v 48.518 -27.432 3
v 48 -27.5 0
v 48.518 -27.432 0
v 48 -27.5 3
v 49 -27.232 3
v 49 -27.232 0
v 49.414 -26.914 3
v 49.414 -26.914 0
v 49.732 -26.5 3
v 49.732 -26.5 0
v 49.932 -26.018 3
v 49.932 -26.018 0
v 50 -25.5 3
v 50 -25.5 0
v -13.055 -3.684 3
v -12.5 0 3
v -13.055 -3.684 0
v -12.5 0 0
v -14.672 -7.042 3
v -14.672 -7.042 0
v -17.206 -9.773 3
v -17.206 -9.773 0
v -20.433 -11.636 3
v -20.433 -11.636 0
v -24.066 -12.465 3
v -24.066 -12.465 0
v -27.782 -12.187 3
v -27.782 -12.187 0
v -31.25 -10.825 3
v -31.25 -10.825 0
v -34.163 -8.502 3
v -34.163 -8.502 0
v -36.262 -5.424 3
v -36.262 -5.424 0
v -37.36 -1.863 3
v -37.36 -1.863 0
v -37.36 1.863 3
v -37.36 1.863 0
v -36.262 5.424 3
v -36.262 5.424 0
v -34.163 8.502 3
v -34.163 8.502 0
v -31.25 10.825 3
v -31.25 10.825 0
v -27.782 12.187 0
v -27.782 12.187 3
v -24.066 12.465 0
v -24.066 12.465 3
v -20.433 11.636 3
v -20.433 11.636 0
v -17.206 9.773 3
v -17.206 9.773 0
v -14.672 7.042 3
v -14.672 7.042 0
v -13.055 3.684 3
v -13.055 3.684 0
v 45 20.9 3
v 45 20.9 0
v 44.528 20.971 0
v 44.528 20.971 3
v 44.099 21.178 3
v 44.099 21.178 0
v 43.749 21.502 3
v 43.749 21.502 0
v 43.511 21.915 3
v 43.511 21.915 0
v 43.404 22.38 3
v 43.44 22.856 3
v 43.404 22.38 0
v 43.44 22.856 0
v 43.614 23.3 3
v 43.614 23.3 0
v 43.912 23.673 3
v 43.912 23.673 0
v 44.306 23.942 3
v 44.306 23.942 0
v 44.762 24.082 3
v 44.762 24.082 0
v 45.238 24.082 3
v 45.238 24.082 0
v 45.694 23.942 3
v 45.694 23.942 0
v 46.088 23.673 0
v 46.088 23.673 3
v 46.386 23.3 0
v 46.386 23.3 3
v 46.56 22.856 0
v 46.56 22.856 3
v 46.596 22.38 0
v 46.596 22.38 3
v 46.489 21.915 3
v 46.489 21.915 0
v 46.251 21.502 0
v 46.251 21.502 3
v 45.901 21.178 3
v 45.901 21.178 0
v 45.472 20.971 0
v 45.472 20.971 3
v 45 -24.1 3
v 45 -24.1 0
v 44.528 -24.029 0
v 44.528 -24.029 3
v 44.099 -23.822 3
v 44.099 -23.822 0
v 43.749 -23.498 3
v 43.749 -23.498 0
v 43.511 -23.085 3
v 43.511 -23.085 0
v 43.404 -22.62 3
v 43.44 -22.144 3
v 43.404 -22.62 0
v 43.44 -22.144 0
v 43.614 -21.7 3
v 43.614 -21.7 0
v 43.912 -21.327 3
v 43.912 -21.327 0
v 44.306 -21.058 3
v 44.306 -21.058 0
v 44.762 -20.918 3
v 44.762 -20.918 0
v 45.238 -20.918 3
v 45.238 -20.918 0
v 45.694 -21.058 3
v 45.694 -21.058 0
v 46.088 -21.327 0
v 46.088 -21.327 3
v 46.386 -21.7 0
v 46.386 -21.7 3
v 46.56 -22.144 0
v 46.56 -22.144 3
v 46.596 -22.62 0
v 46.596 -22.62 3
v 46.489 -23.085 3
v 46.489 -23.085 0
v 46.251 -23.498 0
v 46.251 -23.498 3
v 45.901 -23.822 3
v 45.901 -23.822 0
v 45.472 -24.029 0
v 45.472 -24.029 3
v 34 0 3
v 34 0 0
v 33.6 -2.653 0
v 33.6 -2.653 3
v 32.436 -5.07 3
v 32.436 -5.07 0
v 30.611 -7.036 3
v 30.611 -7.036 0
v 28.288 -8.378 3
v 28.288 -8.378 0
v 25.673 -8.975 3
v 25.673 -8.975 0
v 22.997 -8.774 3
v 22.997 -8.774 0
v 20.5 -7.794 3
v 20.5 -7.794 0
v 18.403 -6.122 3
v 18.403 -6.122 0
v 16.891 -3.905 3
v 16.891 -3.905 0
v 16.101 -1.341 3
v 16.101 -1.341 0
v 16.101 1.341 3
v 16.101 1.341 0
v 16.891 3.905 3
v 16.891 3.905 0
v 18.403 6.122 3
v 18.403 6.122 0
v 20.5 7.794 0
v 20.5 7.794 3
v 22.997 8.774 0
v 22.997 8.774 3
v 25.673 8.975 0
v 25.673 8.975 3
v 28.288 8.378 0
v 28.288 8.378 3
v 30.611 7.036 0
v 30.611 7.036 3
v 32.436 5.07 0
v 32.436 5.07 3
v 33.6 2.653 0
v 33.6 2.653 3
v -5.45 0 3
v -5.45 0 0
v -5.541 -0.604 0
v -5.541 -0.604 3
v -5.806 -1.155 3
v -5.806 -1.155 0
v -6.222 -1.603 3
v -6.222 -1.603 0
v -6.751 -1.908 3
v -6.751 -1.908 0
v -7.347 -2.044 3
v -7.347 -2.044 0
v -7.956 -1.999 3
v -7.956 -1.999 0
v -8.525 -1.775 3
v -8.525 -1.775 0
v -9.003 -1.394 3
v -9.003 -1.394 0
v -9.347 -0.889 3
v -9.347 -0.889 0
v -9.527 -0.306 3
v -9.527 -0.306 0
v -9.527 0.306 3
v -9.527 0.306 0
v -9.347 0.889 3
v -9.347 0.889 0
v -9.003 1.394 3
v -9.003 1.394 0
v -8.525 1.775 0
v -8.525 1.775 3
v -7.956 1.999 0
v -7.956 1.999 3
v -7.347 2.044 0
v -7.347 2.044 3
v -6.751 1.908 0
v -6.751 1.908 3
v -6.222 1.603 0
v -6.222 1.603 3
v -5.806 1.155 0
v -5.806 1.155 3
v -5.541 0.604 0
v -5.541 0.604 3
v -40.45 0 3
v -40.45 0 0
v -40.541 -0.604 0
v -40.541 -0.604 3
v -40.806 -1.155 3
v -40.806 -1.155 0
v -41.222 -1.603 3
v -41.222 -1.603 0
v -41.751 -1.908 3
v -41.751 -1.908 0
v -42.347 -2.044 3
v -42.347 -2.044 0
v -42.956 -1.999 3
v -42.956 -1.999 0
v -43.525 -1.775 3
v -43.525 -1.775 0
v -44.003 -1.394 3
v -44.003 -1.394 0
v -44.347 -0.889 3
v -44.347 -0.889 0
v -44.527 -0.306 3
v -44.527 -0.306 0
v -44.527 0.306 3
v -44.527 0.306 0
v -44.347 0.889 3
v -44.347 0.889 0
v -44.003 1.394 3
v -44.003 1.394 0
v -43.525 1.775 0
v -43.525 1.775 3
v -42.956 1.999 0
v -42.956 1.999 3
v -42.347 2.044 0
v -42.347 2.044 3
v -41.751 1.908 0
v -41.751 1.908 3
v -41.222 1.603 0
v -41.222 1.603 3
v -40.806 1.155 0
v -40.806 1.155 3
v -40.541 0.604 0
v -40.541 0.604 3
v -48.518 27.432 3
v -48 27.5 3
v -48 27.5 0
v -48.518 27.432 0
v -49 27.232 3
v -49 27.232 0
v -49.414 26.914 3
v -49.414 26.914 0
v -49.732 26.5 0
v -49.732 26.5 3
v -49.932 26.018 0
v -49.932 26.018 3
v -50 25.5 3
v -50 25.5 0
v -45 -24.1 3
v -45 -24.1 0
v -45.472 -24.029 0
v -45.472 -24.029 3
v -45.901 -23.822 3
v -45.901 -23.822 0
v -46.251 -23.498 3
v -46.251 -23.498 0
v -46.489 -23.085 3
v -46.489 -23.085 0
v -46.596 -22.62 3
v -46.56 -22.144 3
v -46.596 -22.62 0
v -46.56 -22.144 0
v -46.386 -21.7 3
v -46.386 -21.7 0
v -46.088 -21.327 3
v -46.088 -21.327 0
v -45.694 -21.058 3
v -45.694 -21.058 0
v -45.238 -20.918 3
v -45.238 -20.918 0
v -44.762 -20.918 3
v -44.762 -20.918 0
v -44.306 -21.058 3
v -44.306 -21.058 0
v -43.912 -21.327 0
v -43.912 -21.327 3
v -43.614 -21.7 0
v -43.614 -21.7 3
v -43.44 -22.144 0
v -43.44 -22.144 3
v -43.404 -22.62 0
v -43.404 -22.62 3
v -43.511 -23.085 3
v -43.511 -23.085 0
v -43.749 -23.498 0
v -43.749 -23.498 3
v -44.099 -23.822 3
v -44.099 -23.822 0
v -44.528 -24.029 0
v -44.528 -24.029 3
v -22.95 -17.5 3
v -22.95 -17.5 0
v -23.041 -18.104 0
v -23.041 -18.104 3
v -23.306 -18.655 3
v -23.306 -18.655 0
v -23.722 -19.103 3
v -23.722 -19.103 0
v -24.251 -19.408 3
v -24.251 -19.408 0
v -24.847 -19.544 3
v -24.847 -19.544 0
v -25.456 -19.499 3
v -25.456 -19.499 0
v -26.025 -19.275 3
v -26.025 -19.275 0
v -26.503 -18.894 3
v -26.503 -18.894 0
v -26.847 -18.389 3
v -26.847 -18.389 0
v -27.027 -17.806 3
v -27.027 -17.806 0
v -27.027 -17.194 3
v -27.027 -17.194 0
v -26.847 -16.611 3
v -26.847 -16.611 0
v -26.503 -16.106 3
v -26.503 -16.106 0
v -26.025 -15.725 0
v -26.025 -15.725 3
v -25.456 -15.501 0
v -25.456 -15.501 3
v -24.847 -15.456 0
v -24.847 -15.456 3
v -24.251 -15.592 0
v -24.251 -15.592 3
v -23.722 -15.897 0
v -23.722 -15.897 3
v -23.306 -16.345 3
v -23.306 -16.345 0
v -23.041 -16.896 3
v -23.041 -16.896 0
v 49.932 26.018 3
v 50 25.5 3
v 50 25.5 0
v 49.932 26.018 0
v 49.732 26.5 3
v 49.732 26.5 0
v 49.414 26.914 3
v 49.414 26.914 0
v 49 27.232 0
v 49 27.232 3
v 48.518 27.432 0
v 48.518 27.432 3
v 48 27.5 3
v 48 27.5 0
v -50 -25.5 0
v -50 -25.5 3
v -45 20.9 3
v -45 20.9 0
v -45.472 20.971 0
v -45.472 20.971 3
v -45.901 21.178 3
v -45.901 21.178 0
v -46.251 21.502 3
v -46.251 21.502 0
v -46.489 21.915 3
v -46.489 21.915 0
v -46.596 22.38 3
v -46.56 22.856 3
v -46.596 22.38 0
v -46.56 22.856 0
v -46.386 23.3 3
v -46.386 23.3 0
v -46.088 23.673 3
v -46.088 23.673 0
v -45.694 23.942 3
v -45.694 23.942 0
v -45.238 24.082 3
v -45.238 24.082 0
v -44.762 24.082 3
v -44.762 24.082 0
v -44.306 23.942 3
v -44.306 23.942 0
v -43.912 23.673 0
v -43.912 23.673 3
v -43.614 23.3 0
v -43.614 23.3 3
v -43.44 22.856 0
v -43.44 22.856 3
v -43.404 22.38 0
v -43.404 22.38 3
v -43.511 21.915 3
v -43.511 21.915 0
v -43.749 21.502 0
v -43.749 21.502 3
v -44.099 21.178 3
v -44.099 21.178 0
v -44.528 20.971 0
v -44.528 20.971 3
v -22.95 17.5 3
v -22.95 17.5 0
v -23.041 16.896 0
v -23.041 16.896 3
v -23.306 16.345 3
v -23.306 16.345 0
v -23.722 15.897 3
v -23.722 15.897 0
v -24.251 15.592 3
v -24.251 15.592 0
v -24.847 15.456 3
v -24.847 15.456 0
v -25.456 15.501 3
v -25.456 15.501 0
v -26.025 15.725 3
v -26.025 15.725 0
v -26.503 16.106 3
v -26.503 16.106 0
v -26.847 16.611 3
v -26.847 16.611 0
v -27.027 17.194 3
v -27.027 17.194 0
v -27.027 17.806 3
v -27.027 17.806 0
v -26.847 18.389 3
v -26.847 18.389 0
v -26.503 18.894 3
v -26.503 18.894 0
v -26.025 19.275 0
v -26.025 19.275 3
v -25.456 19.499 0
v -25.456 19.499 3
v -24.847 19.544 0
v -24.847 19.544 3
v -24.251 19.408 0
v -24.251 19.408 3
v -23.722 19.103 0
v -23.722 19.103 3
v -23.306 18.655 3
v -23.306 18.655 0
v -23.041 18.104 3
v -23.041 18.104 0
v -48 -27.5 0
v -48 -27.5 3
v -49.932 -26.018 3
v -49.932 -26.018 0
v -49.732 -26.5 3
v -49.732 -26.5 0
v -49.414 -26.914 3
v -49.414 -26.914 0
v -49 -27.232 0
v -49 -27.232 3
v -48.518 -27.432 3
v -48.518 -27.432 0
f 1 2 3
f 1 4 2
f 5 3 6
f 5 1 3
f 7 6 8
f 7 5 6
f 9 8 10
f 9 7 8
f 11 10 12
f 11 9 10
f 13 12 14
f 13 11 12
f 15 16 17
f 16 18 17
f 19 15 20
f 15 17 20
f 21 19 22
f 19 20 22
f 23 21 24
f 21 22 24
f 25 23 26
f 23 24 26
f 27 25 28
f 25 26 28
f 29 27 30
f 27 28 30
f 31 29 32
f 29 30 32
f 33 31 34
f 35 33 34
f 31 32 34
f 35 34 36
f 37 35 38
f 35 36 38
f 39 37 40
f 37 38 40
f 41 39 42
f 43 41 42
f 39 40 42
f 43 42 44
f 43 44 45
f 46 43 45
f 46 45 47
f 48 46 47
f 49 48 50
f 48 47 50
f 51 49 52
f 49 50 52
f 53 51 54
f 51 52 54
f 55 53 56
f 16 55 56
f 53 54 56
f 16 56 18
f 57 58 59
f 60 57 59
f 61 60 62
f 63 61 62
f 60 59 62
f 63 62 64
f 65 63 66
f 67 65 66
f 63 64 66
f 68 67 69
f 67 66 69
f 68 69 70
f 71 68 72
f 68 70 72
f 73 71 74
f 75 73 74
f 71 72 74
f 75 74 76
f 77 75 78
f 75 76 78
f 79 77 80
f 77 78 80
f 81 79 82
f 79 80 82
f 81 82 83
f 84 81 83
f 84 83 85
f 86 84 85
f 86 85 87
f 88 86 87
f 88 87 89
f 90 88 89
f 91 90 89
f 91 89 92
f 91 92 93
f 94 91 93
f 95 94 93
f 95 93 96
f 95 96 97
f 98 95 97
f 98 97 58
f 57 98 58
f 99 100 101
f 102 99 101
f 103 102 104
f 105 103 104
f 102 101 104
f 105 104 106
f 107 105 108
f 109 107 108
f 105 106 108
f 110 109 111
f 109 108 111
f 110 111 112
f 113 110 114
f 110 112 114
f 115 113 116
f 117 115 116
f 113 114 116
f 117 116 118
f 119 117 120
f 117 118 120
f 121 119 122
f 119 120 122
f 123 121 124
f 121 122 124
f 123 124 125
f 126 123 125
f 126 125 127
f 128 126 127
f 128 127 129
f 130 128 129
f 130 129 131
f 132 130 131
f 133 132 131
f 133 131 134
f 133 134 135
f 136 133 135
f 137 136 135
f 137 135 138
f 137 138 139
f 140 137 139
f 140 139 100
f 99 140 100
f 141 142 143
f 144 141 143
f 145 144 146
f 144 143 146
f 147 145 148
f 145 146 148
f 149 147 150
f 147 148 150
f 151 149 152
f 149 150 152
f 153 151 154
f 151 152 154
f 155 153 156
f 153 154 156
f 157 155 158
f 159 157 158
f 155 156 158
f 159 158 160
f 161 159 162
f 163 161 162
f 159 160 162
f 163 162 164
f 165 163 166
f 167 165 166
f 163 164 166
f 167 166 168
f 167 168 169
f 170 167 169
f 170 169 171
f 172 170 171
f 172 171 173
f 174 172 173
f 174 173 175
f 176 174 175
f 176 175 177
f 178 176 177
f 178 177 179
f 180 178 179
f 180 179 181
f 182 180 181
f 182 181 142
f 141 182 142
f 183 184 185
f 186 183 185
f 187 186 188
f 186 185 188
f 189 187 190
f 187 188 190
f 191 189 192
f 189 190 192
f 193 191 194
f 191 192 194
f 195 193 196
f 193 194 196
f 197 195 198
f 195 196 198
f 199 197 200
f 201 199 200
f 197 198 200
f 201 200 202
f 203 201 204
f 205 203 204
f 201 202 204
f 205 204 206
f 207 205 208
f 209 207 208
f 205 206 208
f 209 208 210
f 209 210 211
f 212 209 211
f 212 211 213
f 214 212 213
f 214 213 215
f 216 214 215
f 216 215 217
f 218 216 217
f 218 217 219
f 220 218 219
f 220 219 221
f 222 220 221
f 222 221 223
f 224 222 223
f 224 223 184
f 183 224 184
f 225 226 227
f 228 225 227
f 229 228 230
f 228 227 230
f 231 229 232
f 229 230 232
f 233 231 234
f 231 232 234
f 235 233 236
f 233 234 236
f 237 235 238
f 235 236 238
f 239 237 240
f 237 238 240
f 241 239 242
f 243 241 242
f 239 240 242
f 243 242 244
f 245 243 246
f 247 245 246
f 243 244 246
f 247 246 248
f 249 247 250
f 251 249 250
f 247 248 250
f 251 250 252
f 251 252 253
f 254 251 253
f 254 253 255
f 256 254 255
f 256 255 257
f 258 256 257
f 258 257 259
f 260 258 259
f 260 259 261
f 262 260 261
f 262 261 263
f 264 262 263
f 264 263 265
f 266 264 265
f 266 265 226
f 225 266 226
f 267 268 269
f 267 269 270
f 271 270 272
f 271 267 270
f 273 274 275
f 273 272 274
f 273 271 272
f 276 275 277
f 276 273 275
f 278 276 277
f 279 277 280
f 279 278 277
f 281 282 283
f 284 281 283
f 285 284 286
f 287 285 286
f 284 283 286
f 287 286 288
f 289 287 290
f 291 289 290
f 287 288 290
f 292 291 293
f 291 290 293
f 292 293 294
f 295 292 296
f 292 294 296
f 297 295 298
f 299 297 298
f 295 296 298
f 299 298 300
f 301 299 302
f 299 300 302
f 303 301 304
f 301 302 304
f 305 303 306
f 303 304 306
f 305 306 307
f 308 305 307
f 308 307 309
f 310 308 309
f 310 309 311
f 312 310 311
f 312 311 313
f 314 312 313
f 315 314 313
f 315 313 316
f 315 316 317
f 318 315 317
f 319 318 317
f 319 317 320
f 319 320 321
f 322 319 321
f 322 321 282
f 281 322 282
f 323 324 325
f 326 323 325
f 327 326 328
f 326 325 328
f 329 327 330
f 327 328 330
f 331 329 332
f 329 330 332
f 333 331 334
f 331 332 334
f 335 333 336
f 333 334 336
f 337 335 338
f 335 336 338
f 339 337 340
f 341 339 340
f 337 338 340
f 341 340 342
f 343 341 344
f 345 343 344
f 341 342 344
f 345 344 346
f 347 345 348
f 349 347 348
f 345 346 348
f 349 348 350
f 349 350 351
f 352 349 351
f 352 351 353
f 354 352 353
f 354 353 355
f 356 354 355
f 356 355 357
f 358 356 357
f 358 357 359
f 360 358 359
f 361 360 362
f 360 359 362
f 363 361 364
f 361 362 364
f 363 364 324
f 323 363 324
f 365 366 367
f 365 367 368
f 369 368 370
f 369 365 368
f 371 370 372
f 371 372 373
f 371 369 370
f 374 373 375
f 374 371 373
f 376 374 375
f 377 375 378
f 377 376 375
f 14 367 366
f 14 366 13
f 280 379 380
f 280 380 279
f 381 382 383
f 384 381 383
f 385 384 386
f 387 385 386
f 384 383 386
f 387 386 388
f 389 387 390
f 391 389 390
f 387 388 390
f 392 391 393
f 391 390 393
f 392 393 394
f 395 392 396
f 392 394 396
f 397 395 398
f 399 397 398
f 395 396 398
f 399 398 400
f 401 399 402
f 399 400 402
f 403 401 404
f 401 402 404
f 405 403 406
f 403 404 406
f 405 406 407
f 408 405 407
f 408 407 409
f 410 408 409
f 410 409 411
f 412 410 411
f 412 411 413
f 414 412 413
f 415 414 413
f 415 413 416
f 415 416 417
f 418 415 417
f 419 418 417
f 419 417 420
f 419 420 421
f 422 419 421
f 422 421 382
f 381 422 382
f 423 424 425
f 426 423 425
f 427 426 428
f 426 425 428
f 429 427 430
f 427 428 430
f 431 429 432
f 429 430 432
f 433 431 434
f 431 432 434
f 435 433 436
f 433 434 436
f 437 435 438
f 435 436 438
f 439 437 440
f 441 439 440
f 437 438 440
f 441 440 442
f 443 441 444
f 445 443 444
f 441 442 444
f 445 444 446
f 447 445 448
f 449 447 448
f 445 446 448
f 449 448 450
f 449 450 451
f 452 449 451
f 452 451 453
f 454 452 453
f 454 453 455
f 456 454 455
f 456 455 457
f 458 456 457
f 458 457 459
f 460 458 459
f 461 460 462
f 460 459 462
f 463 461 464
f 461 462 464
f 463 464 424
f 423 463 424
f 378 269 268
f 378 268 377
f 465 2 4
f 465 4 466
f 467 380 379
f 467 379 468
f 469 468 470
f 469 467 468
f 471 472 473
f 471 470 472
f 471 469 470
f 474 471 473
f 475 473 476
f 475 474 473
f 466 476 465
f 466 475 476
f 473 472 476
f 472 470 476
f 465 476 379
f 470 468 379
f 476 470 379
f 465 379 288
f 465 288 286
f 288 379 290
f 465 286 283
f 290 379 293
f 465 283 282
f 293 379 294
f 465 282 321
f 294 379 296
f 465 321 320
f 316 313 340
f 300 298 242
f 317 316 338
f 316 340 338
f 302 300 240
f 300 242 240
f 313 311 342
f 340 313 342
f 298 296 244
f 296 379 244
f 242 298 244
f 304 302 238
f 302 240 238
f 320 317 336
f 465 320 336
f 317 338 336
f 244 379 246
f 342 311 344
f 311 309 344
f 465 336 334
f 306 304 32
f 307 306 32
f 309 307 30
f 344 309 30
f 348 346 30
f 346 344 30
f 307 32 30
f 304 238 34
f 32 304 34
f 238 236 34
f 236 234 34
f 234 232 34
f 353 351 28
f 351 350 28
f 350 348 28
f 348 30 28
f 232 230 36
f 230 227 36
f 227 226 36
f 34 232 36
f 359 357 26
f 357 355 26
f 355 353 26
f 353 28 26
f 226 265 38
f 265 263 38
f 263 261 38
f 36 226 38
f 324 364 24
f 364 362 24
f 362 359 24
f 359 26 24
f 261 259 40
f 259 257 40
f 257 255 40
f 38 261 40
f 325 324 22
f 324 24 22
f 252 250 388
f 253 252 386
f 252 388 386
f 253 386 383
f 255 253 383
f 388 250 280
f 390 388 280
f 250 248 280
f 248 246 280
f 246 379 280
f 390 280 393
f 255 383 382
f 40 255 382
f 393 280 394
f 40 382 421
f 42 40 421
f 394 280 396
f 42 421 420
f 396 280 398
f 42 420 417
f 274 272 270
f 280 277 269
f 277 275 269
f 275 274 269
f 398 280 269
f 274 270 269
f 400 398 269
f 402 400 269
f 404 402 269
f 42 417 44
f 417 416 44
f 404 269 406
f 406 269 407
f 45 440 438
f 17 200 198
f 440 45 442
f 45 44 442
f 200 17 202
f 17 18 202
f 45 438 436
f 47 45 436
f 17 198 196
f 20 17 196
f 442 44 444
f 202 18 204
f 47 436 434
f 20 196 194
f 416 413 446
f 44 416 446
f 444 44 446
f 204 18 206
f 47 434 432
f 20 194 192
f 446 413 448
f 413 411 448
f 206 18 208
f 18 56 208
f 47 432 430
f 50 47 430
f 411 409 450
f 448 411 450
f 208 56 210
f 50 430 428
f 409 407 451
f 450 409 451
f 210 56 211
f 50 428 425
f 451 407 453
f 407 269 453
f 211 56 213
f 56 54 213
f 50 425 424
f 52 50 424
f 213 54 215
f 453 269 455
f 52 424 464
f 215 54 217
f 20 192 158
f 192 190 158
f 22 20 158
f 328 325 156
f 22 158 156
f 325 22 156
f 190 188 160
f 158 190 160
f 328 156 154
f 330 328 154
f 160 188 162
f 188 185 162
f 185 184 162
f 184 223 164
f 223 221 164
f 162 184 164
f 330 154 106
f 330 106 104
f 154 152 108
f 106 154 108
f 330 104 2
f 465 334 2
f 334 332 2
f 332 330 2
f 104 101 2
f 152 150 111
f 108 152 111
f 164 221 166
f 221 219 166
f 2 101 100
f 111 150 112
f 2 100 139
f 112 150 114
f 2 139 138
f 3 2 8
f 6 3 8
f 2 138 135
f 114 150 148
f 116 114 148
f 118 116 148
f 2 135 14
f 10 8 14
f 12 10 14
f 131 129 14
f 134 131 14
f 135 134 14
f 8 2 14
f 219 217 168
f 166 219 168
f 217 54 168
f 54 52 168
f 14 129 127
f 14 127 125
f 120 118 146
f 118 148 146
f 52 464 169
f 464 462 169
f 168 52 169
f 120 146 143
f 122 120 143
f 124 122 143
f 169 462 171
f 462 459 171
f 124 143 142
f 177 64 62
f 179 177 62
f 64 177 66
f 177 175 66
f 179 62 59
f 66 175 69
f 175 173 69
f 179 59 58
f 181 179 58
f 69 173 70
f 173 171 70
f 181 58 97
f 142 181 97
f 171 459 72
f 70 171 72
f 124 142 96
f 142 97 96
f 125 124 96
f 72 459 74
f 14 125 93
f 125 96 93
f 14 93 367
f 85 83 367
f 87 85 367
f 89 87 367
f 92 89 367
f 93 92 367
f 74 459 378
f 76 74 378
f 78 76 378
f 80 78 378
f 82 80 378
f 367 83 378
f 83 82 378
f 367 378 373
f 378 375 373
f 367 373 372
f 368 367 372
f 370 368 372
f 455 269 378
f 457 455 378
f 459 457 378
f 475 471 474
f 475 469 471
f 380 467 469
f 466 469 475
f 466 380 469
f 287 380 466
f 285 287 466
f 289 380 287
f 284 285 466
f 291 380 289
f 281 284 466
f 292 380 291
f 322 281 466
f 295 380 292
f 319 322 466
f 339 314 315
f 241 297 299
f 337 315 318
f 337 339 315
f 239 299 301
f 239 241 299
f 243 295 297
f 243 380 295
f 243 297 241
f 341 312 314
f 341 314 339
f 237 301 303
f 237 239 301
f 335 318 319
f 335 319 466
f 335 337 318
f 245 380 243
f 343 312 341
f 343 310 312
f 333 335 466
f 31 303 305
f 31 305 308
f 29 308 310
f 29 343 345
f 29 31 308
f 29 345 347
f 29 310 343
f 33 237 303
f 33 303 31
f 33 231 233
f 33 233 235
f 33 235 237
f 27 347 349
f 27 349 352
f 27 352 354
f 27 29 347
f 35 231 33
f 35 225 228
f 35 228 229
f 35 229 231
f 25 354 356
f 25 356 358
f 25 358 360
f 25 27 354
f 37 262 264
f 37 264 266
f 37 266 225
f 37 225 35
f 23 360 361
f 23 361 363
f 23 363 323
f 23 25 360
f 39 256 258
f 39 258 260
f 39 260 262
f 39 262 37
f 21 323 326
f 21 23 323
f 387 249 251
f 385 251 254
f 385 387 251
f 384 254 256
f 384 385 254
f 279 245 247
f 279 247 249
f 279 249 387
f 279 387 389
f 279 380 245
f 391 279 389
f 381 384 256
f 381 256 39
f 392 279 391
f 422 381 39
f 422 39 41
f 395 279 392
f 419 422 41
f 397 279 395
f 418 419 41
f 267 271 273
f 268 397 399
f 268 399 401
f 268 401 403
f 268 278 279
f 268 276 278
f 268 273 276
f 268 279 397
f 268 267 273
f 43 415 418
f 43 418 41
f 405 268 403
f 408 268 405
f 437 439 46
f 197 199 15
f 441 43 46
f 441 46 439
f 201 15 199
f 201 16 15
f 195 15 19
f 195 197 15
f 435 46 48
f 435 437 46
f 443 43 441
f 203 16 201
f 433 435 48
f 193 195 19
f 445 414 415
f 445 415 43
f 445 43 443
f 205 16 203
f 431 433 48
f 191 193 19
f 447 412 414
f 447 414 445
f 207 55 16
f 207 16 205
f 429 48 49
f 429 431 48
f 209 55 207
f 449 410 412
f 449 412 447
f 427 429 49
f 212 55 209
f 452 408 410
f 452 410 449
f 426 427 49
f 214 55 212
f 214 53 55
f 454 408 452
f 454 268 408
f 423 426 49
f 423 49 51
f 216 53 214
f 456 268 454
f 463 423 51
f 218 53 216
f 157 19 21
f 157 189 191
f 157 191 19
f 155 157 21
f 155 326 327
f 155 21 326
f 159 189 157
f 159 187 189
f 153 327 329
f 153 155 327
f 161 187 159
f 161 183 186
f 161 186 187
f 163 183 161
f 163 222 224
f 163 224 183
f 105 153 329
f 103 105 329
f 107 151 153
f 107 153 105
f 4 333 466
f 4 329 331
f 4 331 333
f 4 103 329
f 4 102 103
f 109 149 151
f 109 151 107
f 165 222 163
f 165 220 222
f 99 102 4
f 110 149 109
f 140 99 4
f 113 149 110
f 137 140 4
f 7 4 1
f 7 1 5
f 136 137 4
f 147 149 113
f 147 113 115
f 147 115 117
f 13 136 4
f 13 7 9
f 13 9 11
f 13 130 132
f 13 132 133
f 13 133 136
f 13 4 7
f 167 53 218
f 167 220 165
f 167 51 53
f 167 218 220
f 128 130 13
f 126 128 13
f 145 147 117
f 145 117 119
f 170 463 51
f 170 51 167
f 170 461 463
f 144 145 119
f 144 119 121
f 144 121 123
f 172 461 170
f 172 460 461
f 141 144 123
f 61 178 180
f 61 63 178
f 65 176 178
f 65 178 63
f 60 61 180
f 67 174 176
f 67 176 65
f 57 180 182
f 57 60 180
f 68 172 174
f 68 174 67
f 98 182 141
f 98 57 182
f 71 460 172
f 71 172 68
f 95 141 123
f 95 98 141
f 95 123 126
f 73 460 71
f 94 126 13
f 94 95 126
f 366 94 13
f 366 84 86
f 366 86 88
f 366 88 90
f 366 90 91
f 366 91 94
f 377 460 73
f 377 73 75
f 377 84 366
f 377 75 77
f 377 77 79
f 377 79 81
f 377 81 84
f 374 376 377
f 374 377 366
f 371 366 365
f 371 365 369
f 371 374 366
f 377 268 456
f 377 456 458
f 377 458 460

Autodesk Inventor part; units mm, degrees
ref_plane "YZ Plane" through (0, 0, 0) normal (1, 0, 0) x (0, 1, 0)
ref_plane "XZ Plane" through (0, 0, 0) normal (0, 1, 0) x (-1, 0, 0)
ref_plane "XY Plane" through (0, 0, 0) normal (0, 0, 1) x (1, 0, 0)
sketch "スケッチ1" plane through (0, 0, 0) normal (0, 0, 1) x (1, 0, 0)
  line L0 (50, -27.5) -> (-50, -27.5)
  line L1 (-50, -27.5) -> (-50, 27.5)
  line L2 (-50, 27.5) -> (50, 27.5)
  line L3 (50, 27.5) -> (50, -27.5)
  line L4 (50, -27.5) -> (-50, 27.5) construction
  line L5 (-50, -27.5) -> (50, 27.5) construction
  circle A0 centre (0, 0) radius 25
  line L6 (-50, 0) -> (50, 0)
  circle A1 centre (25, 0) radius 9
  circle A2 centre (-25, 0) radius 12.5
  circle A3 centre (-25, 0) radius 17.5
  circle A4 centre (-25, 17.5) radius 2.05
  circle A5 centre (-42.5, 0) radius 2.05
  circle A6 centre (-25, -17.5) radius 2.05
  circle A7 centre (-7.5, 0) radius 2.05
  dimension "d5" = 35
  dimension "d0" = 100
  dimension "d1" = 55
  dimension "d2" = 50
  dimension "d3" = 18
  dimension "d4" = 25
  dimension "d6" = 4.1
  dimension "d9" = 360
  dimension "d11" = 25
extrude "押し出し1" add sketch "スケッチ1" along normal blind 3 contours L0 L1 L6 A5 A3 A6 A0 A1 L3 | L6 A1 A0 A3 A4 A5 L1 L2 L3 | A1 L6 A7 A3 A0 | A0 A3 A7 L6 A1 | A3 A4 A0 A2 L6 A5 | A5 L6 A2 A0 A3 A6 | A3 A7 L6 A2 A0 | A0 A2 L6 A7 A3
sketch "スケッチ2" plane through (0, 0, 3) normal (0, 0, 1) x (1, 0, 0)
  line L0 (50, 27.5) -> (-50, 27.5) projected
  line L1 (-50, 27.5) -> (-50, -27.5) projected
  line L2 (-50, -27.5) -> (50, -27.5) projected
  line L3 (50, -27.5) -> (50, 27.5) projected
  circle A0 centre (25, 0) radius 9 projected
  circle A1 centre (-7.5, 0) radius 2.05 projected
  circle A2 centre (-25, 17.5) radius 2.05 projected
  circle A3 centre (-42.5, 0) radius 2.05 projected
  circle A4 centre (-25, -17.5) radius 2.05 projected
  circle A5 centre (-25, 0) radius 12.5 projected
  line L4 (-45, 22.5) -> (45, 22.5)
  line L5 (45, 22.5) -> (45, -22.5)
  line L6 (45, -22.5) -> (-45, -22.5)
  line L7 (-45, -22.5) -> (-45, 22.5)
  point P0 (0, 0)
  dimension "d14" = 5
hole "穴1" at (-45, 22.5, 3) at (-45, -22.5, 3) at (45, -22.5, 3) at (45, 22.5, 3) direction (0, 0, -1) diameter 3.2 end through all
fillet "フィレット1" radius 2 4 edges at (-50, 27.5, 1.5) (50, 27.5, 1.5) (50, -27.5, 1.5) (-50, -27.5, 1.5)
sketch "スケッチ3" plane through (0, 0, 3) normal (0, 0, 1) x (1, 0, 0)
  arc A0 (-50, -25.5) -> (-48, -27.5) centre (-48, -25.5) ccw projected
  line L0 (-48, -27.5) -> (48, -27.5) projected
  arc A1 (48, -27.5) -> (50, -25.5) centre (48, -25.5) ccw projected
  line L1 (50, -25.5) -> (50, 25.5) projected
  arc A2 (50, 25.5) -> (48, 27.5) centre (48, 25.5) ccw projected
  line L2 (48, 27.5) -> (-48, 27.5) projected
  arc A3 (-48, 27.5) -> (-50, 25.5) centre (-48, 25.5) ccw projected
  line L3 (-50, 25.5) -> (-50, -25.5) projected
  circle A4 centre (45, 22.5) radius 1.6 projected
  circle A5 centre (45, -22.5) radius 1.6 projected
  circle A6 centre (-45, -22.5) radius 1.6 projected
  circle A7 centre (-45, 22.5) radius 1.6 projected
  circle A8 centre (25, 0) radius 9 projected
  circle A9 centre (-7.5, 0) radius 2.05 projected
  circle A10 centre (-25, 17.5) radius 2.05 projected
  circle A11 centre (-42.5, 0) radius 2.05 projected
  circle A12 centre (-25, -17.5) radius 2.05 projected
  circle A13 centre (-25, 0) radius 12.5 projected
  point P0 (0, 0)
equation "\"d11\" = -0.5 * d2 + 0.5 * d0"
properties part number "xx_plate_motor"
